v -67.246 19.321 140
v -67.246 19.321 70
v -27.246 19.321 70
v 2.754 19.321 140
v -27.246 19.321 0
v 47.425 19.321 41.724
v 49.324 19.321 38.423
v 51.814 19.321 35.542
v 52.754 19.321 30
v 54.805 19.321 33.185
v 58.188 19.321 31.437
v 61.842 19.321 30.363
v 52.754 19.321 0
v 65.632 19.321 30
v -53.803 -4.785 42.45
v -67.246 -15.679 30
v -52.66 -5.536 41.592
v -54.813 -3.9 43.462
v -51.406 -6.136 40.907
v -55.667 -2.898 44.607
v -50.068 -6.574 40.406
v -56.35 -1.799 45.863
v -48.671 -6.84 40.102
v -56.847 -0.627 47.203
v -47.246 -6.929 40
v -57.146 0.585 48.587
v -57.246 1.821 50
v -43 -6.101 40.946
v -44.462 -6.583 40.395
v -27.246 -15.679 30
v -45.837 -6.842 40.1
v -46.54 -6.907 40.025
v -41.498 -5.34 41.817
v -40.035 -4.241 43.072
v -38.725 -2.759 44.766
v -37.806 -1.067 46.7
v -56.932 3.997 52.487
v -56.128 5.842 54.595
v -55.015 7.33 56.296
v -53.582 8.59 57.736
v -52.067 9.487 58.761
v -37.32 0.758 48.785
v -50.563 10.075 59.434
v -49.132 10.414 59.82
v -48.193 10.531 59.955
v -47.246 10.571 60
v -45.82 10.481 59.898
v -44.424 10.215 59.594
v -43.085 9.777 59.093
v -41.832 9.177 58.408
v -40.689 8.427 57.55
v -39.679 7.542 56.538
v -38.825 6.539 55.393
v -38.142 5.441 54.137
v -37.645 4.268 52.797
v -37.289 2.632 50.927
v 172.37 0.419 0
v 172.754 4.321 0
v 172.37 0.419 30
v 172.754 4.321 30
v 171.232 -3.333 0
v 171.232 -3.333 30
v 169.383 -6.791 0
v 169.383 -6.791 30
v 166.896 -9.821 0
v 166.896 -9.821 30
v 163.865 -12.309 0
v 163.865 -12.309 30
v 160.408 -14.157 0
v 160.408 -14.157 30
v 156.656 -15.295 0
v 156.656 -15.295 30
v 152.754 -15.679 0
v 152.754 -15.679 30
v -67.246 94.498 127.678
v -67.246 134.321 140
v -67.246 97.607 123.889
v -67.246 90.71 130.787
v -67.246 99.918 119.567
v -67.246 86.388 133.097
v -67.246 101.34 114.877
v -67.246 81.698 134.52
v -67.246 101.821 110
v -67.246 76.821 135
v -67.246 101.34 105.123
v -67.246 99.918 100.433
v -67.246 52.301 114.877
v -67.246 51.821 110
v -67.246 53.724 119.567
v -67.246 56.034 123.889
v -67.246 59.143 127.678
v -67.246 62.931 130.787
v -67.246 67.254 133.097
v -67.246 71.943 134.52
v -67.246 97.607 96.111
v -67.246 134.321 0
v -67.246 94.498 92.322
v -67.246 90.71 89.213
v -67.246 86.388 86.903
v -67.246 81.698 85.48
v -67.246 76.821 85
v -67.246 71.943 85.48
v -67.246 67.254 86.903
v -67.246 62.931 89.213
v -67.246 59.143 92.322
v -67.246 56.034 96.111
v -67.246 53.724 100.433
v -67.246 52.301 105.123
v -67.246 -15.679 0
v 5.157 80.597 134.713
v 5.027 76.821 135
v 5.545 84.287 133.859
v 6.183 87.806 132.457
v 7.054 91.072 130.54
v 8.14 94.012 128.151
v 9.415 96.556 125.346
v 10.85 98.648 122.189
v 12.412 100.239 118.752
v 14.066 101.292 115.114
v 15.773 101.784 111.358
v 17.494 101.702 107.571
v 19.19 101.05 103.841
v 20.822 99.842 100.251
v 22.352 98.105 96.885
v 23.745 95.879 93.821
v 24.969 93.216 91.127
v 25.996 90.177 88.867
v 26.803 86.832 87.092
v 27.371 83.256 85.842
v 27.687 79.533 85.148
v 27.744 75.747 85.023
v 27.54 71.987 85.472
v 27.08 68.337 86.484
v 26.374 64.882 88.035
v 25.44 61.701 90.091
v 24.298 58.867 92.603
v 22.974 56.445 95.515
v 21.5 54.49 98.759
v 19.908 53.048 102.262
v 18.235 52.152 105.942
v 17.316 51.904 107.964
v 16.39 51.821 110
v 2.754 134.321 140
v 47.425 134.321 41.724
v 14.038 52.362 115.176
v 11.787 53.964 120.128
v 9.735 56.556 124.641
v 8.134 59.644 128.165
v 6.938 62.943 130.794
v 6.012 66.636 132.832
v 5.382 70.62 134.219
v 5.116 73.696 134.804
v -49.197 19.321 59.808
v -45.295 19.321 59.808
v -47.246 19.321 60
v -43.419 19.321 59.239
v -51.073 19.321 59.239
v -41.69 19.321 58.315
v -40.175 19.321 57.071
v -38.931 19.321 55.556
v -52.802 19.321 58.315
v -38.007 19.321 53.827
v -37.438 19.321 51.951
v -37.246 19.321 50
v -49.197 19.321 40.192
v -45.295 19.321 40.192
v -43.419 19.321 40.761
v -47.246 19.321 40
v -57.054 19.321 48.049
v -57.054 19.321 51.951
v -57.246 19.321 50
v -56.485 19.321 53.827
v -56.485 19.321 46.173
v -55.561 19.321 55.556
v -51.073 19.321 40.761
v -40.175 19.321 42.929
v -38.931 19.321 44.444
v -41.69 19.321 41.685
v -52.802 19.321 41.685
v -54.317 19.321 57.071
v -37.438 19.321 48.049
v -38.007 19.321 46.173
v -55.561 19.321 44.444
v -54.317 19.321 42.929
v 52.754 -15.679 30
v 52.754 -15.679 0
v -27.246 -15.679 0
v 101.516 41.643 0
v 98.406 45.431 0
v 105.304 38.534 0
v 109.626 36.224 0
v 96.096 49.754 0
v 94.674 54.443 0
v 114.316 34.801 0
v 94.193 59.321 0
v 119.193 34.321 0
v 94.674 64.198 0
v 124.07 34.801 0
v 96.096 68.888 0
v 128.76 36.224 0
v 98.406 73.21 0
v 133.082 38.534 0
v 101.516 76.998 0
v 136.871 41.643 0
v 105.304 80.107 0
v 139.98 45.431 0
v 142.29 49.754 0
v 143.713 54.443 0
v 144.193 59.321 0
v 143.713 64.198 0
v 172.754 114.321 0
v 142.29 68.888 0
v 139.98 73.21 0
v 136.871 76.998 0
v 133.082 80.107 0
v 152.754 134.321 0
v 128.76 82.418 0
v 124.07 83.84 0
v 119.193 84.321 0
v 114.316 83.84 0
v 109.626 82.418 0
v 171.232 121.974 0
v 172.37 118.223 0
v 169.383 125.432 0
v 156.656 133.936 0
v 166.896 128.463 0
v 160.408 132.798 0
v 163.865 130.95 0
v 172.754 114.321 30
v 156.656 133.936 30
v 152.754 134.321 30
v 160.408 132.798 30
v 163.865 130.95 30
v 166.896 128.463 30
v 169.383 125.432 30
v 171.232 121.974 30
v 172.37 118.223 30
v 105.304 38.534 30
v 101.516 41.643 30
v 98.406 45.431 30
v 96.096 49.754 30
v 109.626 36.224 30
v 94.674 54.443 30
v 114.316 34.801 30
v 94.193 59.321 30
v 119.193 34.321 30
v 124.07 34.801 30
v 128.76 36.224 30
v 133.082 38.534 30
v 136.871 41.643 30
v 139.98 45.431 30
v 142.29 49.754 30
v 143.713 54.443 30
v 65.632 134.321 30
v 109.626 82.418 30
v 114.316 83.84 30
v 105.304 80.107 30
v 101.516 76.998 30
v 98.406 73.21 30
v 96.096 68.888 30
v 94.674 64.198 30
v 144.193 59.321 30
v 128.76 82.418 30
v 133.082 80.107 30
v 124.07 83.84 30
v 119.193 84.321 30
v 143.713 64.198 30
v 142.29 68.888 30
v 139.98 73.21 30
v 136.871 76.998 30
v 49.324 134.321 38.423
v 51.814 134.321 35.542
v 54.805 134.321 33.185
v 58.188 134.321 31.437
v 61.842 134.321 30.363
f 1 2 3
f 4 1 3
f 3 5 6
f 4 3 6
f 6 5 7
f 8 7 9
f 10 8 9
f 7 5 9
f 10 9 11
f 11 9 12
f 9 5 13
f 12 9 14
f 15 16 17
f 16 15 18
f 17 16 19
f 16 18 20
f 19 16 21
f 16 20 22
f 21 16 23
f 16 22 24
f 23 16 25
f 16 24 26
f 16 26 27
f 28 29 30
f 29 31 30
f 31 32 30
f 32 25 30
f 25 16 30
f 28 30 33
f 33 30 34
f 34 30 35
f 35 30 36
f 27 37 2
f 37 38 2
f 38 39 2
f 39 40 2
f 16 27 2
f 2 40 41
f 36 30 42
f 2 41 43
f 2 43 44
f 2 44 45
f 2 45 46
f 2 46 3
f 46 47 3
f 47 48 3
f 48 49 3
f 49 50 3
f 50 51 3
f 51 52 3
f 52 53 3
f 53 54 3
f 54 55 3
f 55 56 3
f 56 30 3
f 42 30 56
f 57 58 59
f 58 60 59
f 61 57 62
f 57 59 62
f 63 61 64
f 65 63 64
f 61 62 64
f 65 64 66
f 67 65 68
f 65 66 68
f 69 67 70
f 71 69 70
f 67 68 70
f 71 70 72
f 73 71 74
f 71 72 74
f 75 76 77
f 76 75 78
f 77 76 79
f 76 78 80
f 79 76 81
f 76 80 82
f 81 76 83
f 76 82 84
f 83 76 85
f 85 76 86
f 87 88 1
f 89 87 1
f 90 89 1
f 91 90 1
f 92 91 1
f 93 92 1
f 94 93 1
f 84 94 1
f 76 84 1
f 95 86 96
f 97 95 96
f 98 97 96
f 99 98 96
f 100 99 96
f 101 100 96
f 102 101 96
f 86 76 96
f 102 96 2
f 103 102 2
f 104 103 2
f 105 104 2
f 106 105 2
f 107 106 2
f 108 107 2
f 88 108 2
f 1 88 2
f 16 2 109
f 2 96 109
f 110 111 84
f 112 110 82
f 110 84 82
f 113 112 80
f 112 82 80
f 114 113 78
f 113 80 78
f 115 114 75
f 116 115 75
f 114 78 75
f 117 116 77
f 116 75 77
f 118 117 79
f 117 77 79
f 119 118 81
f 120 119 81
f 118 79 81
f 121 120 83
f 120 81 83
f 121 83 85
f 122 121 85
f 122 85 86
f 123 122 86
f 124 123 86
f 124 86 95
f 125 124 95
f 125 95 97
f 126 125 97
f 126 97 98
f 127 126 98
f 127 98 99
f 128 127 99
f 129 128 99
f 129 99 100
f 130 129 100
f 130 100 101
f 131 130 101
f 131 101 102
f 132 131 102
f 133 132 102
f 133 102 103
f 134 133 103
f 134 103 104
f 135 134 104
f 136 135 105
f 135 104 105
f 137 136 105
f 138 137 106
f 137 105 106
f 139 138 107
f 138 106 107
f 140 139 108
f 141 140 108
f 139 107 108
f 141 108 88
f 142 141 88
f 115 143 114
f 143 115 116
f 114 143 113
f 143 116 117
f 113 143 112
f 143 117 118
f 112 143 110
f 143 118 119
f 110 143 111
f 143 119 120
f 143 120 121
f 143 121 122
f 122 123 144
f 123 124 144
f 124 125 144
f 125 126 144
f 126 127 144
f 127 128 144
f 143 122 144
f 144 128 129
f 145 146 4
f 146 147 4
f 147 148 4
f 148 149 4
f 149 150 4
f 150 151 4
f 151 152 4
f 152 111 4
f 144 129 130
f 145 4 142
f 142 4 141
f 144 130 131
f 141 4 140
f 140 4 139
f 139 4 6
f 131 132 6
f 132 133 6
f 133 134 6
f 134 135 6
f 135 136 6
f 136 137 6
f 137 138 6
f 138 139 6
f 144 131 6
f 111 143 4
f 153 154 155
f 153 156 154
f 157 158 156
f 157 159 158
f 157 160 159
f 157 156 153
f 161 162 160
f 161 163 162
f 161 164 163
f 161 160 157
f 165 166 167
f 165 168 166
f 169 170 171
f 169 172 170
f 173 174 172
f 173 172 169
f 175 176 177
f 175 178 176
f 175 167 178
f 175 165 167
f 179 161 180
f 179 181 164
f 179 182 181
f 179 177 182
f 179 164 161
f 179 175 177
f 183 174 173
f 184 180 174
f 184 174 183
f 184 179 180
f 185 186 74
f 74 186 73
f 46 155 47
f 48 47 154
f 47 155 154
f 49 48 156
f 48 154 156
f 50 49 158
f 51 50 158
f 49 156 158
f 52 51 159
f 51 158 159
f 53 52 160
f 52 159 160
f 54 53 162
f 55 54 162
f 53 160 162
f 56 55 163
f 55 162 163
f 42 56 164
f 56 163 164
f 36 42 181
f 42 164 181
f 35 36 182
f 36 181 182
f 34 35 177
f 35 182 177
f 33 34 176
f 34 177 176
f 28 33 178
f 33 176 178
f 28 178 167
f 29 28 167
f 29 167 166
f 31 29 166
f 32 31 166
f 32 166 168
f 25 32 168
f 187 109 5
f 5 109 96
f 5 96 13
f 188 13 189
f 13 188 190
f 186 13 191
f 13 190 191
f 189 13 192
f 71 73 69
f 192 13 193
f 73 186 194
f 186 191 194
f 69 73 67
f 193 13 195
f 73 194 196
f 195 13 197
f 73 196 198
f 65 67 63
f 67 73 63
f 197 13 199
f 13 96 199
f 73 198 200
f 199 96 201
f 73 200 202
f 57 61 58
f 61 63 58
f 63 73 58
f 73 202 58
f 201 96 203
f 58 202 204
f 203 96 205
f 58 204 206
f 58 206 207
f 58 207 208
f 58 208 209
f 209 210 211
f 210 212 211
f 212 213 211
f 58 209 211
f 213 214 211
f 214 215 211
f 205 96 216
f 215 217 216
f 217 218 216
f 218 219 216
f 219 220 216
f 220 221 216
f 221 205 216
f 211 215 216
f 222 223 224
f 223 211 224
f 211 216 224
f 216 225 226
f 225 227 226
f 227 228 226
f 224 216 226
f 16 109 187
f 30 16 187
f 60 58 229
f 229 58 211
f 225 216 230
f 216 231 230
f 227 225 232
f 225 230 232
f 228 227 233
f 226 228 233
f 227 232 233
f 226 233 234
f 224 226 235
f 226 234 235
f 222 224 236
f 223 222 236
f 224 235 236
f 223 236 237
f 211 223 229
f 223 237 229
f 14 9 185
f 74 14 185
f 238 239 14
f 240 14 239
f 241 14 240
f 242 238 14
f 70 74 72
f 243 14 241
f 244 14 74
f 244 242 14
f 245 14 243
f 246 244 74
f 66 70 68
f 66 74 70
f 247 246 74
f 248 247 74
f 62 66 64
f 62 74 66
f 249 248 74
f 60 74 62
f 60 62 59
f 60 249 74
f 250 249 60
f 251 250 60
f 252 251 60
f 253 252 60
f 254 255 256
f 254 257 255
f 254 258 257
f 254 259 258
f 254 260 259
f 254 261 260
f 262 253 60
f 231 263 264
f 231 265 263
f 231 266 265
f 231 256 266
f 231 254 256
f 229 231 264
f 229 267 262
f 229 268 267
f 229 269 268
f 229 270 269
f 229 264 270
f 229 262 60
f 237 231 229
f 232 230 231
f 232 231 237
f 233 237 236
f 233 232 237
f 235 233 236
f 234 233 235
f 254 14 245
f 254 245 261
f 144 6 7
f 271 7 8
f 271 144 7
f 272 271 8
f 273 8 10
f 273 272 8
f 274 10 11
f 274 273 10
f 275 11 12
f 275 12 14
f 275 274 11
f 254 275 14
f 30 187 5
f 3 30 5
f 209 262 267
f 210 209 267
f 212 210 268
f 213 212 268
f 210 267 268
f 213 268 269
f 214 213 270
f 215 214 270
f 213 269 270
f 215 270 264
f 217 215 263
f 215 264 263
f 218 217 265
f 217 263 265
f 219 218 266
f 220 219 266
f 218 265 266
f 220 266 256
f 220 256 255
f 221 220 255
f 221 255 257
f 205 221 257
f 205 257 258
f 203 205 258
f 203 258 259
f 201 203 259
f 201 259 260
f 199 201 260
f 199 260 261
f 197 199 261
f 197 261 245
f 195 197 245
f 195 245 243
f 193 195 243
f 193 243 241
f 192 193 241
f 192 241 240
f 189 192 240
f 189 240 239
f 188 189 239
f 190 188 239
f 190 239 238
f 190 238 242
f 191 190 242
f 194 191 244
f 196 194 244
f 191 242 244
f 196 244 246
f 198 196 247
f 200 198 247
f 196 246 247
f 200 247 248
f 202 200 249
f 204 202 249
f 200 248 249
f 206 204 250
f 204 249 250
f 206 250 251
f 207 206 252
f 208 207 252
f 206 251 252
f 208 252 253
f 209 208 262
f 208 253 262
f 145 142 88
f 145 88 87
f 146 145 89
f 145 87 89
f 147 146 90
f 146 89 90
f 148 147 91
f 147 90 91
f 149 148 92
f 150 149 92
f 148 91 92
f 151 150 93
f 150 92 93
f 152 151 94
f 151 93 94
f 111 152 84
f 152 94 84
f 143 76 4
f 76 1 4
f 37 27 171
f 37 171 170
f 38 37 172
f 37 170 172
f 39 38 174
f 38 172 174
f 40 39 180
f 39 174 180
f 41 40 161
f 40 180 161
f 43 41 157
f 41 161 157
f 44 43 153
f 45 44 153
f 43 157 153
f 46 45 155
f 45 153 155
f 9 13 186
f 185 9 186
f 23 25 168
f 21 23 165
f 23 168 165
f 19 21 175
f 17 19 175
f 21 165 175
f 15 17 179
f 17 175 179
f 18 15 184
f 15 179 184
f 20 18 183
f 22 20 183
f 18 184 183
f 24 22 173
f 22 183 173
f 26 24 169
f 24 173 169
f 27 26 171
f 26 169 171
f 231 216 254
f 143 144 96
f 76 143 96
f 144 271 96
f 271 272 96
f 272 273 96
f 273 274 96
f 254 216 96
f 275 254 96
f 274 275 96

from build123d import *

# Parameters (mm, degrees)
F1_W      = 40
F1_H      = 35
F2_DEPTH  = 70
F3_DEPTH  = 30
F5_DEPTH  = 103
F6_R      = 20
F8_DEPTH  = 28
F10_DEPTH = 140
F12_DEPTH = 1016
F13_R     = 20
F15_DEPTH = 80
F17_DEPTH = 396


with BuildPart() as f2:
    # F1 (on face) → F2 (new body)
    with BuildSketch(Plane.XY):
        with Locations((-47.2459378839, 1.8207169324)):
            Rectangle(F1_W, F1_H)
    extrude(amount=F2_DEPTH)

    # F0 (on Top) → F3 (join)
    with BuildSketch(Plane.XY):
        Polygon((172.7540621161, 134.3207169324), (-67.2459378839, 134.3207169324), (-67.2459378839, -15.6792830676), (-27.2459378839, -15.6792830676), (-27.2459378839, 19.3207169324), (52.7540621161, 19.3207169324), (52.7540621161, -15.6792830676), (172.7540621161, -15.6792830676), align=None)
    extrude(amount=F3_DEPTH)

    # F4 (on face) → F5 (cut)
    with BuildSketch(Plane.YZ.offset(-27.2459378839)):
        Polygon((-15.6792830676, 70), (-15.6792830676, 30), (19.3207169324, 70), align=None)
    extrude(amount=-F5_DEPTH, mode=Mode.SUBTRACT)

    # F6
    f6_edges = [f2.edges().sort_by_distance(p)[0] for p in [
        (172.754062, -15.679283, 15),
        (172.754062, 134.320717, 15),
    ]]
    fillet(f6_edges, radius=F6_R)

    # F7 (on face) → F8 (cut)
    with BuildSketch(Plane(origin=(0, 19.3207169324, 0), x_dir=(-1, 0, 0), z_dir=(0, 1, 0))):
        with BuildLine():
            ThreePointArc((57.2459378839, 50), (54.3170056957, 57.0710678119), (47.2459378839, 60))
            Line((47.2459378839, 60), (47.2459378839, 40))
            ThreePointArc((47.2459378839, 40), (54.3170056957, 42.9289321881), (57.2459378839, 50))
        make_face()
        with BuildLine():
            Line((47.2459378839, 40), (47.2459378839, 60))
            ThreePointArc((47.2459378839, 60), (37.2459378839, 50), (47.2459378839, 40))
        make_face()
    extrude(amount=-F8_DEPTH, mode=Mode.SUBTRACT)

    # F9 (on face) → F10 (join)
    with BuildSketch(Plane(origin=(0, 0, 0), x_dir=(1, 0, 0), z_dir=(0, 0, -1))):
        Polygon((52.7540621161, -134.3207169324), (52.7540621161, -19.3207169324), (-27.2459378839, -19.3207169324), (-67.2459378839, -19.3207169324), (-67.2459378839, -134.3207169324), align=None)
    extrude(amount=-F10_DEPTH)

    # F11 (on face) → F12 (cut)
    with BuildSketch(Plane.XZ.offset(-19.3207169324)):
        Polygon((52.7540621161, 140), (2.7540621161, 140), (52.7540621161, 30), align=None)
    extrude(amount=-F12_DEPTH, mode=Mode.SUBTRACT)

    # F13
    f13_edges = [f2.edges().sort_by_distance(p)[0] for p in [
        (52.754062, 76.820717, 30),
    ]]
    fillet(f13_edges, radius=F13_R)

    # F14 (on face) → F15 (cut)
    with BuildSketch(Plane.XY.offset(30)):
        with BuildLine():
            ThreePointArc((94.1931948194, 59.3207169324), (119.1931948194, 34.3207169324), (144.1931948194, 59.3207169324))
            Line((144.1931948194, 59.3207169324), (94.1931948194, 59.3207169324))
        make_face()
        with BuildLine():
            Line((94.1931948194, 59.3207169324), (144.1931948194, 59.3207169324))
            ThreePointArc((144.1931948194, 59.3207169324), (119.1931948194, 84.3207169324), (94.1931948194, 59.3207169324))
        make_face()
    extrude(amount=-F15_DEPTH, mode=Mode.SUBTRACT)

    # F16 (on face) → F17 (cut)
    with BuildSketch(Plane(origin=(-67.2459378839, 0, 0), x_dir=(0, -1, 0), z_dir=(-1, 0, 0))):
        with BuildLine():
            ThreePointArc((-76.8207169324, 135), (-94.4983864621, 92.3223304703), (-51.8207169324, 110))
            ThreePointArc((-51.8207169324, 110), (-59.1430474028, 127.6776695297), (-76.8207169324, 135))
        make_face()
    extrude(amount=-F17_DEPTH, mode=Mode.SUBTRACT)


solid = f2.part
